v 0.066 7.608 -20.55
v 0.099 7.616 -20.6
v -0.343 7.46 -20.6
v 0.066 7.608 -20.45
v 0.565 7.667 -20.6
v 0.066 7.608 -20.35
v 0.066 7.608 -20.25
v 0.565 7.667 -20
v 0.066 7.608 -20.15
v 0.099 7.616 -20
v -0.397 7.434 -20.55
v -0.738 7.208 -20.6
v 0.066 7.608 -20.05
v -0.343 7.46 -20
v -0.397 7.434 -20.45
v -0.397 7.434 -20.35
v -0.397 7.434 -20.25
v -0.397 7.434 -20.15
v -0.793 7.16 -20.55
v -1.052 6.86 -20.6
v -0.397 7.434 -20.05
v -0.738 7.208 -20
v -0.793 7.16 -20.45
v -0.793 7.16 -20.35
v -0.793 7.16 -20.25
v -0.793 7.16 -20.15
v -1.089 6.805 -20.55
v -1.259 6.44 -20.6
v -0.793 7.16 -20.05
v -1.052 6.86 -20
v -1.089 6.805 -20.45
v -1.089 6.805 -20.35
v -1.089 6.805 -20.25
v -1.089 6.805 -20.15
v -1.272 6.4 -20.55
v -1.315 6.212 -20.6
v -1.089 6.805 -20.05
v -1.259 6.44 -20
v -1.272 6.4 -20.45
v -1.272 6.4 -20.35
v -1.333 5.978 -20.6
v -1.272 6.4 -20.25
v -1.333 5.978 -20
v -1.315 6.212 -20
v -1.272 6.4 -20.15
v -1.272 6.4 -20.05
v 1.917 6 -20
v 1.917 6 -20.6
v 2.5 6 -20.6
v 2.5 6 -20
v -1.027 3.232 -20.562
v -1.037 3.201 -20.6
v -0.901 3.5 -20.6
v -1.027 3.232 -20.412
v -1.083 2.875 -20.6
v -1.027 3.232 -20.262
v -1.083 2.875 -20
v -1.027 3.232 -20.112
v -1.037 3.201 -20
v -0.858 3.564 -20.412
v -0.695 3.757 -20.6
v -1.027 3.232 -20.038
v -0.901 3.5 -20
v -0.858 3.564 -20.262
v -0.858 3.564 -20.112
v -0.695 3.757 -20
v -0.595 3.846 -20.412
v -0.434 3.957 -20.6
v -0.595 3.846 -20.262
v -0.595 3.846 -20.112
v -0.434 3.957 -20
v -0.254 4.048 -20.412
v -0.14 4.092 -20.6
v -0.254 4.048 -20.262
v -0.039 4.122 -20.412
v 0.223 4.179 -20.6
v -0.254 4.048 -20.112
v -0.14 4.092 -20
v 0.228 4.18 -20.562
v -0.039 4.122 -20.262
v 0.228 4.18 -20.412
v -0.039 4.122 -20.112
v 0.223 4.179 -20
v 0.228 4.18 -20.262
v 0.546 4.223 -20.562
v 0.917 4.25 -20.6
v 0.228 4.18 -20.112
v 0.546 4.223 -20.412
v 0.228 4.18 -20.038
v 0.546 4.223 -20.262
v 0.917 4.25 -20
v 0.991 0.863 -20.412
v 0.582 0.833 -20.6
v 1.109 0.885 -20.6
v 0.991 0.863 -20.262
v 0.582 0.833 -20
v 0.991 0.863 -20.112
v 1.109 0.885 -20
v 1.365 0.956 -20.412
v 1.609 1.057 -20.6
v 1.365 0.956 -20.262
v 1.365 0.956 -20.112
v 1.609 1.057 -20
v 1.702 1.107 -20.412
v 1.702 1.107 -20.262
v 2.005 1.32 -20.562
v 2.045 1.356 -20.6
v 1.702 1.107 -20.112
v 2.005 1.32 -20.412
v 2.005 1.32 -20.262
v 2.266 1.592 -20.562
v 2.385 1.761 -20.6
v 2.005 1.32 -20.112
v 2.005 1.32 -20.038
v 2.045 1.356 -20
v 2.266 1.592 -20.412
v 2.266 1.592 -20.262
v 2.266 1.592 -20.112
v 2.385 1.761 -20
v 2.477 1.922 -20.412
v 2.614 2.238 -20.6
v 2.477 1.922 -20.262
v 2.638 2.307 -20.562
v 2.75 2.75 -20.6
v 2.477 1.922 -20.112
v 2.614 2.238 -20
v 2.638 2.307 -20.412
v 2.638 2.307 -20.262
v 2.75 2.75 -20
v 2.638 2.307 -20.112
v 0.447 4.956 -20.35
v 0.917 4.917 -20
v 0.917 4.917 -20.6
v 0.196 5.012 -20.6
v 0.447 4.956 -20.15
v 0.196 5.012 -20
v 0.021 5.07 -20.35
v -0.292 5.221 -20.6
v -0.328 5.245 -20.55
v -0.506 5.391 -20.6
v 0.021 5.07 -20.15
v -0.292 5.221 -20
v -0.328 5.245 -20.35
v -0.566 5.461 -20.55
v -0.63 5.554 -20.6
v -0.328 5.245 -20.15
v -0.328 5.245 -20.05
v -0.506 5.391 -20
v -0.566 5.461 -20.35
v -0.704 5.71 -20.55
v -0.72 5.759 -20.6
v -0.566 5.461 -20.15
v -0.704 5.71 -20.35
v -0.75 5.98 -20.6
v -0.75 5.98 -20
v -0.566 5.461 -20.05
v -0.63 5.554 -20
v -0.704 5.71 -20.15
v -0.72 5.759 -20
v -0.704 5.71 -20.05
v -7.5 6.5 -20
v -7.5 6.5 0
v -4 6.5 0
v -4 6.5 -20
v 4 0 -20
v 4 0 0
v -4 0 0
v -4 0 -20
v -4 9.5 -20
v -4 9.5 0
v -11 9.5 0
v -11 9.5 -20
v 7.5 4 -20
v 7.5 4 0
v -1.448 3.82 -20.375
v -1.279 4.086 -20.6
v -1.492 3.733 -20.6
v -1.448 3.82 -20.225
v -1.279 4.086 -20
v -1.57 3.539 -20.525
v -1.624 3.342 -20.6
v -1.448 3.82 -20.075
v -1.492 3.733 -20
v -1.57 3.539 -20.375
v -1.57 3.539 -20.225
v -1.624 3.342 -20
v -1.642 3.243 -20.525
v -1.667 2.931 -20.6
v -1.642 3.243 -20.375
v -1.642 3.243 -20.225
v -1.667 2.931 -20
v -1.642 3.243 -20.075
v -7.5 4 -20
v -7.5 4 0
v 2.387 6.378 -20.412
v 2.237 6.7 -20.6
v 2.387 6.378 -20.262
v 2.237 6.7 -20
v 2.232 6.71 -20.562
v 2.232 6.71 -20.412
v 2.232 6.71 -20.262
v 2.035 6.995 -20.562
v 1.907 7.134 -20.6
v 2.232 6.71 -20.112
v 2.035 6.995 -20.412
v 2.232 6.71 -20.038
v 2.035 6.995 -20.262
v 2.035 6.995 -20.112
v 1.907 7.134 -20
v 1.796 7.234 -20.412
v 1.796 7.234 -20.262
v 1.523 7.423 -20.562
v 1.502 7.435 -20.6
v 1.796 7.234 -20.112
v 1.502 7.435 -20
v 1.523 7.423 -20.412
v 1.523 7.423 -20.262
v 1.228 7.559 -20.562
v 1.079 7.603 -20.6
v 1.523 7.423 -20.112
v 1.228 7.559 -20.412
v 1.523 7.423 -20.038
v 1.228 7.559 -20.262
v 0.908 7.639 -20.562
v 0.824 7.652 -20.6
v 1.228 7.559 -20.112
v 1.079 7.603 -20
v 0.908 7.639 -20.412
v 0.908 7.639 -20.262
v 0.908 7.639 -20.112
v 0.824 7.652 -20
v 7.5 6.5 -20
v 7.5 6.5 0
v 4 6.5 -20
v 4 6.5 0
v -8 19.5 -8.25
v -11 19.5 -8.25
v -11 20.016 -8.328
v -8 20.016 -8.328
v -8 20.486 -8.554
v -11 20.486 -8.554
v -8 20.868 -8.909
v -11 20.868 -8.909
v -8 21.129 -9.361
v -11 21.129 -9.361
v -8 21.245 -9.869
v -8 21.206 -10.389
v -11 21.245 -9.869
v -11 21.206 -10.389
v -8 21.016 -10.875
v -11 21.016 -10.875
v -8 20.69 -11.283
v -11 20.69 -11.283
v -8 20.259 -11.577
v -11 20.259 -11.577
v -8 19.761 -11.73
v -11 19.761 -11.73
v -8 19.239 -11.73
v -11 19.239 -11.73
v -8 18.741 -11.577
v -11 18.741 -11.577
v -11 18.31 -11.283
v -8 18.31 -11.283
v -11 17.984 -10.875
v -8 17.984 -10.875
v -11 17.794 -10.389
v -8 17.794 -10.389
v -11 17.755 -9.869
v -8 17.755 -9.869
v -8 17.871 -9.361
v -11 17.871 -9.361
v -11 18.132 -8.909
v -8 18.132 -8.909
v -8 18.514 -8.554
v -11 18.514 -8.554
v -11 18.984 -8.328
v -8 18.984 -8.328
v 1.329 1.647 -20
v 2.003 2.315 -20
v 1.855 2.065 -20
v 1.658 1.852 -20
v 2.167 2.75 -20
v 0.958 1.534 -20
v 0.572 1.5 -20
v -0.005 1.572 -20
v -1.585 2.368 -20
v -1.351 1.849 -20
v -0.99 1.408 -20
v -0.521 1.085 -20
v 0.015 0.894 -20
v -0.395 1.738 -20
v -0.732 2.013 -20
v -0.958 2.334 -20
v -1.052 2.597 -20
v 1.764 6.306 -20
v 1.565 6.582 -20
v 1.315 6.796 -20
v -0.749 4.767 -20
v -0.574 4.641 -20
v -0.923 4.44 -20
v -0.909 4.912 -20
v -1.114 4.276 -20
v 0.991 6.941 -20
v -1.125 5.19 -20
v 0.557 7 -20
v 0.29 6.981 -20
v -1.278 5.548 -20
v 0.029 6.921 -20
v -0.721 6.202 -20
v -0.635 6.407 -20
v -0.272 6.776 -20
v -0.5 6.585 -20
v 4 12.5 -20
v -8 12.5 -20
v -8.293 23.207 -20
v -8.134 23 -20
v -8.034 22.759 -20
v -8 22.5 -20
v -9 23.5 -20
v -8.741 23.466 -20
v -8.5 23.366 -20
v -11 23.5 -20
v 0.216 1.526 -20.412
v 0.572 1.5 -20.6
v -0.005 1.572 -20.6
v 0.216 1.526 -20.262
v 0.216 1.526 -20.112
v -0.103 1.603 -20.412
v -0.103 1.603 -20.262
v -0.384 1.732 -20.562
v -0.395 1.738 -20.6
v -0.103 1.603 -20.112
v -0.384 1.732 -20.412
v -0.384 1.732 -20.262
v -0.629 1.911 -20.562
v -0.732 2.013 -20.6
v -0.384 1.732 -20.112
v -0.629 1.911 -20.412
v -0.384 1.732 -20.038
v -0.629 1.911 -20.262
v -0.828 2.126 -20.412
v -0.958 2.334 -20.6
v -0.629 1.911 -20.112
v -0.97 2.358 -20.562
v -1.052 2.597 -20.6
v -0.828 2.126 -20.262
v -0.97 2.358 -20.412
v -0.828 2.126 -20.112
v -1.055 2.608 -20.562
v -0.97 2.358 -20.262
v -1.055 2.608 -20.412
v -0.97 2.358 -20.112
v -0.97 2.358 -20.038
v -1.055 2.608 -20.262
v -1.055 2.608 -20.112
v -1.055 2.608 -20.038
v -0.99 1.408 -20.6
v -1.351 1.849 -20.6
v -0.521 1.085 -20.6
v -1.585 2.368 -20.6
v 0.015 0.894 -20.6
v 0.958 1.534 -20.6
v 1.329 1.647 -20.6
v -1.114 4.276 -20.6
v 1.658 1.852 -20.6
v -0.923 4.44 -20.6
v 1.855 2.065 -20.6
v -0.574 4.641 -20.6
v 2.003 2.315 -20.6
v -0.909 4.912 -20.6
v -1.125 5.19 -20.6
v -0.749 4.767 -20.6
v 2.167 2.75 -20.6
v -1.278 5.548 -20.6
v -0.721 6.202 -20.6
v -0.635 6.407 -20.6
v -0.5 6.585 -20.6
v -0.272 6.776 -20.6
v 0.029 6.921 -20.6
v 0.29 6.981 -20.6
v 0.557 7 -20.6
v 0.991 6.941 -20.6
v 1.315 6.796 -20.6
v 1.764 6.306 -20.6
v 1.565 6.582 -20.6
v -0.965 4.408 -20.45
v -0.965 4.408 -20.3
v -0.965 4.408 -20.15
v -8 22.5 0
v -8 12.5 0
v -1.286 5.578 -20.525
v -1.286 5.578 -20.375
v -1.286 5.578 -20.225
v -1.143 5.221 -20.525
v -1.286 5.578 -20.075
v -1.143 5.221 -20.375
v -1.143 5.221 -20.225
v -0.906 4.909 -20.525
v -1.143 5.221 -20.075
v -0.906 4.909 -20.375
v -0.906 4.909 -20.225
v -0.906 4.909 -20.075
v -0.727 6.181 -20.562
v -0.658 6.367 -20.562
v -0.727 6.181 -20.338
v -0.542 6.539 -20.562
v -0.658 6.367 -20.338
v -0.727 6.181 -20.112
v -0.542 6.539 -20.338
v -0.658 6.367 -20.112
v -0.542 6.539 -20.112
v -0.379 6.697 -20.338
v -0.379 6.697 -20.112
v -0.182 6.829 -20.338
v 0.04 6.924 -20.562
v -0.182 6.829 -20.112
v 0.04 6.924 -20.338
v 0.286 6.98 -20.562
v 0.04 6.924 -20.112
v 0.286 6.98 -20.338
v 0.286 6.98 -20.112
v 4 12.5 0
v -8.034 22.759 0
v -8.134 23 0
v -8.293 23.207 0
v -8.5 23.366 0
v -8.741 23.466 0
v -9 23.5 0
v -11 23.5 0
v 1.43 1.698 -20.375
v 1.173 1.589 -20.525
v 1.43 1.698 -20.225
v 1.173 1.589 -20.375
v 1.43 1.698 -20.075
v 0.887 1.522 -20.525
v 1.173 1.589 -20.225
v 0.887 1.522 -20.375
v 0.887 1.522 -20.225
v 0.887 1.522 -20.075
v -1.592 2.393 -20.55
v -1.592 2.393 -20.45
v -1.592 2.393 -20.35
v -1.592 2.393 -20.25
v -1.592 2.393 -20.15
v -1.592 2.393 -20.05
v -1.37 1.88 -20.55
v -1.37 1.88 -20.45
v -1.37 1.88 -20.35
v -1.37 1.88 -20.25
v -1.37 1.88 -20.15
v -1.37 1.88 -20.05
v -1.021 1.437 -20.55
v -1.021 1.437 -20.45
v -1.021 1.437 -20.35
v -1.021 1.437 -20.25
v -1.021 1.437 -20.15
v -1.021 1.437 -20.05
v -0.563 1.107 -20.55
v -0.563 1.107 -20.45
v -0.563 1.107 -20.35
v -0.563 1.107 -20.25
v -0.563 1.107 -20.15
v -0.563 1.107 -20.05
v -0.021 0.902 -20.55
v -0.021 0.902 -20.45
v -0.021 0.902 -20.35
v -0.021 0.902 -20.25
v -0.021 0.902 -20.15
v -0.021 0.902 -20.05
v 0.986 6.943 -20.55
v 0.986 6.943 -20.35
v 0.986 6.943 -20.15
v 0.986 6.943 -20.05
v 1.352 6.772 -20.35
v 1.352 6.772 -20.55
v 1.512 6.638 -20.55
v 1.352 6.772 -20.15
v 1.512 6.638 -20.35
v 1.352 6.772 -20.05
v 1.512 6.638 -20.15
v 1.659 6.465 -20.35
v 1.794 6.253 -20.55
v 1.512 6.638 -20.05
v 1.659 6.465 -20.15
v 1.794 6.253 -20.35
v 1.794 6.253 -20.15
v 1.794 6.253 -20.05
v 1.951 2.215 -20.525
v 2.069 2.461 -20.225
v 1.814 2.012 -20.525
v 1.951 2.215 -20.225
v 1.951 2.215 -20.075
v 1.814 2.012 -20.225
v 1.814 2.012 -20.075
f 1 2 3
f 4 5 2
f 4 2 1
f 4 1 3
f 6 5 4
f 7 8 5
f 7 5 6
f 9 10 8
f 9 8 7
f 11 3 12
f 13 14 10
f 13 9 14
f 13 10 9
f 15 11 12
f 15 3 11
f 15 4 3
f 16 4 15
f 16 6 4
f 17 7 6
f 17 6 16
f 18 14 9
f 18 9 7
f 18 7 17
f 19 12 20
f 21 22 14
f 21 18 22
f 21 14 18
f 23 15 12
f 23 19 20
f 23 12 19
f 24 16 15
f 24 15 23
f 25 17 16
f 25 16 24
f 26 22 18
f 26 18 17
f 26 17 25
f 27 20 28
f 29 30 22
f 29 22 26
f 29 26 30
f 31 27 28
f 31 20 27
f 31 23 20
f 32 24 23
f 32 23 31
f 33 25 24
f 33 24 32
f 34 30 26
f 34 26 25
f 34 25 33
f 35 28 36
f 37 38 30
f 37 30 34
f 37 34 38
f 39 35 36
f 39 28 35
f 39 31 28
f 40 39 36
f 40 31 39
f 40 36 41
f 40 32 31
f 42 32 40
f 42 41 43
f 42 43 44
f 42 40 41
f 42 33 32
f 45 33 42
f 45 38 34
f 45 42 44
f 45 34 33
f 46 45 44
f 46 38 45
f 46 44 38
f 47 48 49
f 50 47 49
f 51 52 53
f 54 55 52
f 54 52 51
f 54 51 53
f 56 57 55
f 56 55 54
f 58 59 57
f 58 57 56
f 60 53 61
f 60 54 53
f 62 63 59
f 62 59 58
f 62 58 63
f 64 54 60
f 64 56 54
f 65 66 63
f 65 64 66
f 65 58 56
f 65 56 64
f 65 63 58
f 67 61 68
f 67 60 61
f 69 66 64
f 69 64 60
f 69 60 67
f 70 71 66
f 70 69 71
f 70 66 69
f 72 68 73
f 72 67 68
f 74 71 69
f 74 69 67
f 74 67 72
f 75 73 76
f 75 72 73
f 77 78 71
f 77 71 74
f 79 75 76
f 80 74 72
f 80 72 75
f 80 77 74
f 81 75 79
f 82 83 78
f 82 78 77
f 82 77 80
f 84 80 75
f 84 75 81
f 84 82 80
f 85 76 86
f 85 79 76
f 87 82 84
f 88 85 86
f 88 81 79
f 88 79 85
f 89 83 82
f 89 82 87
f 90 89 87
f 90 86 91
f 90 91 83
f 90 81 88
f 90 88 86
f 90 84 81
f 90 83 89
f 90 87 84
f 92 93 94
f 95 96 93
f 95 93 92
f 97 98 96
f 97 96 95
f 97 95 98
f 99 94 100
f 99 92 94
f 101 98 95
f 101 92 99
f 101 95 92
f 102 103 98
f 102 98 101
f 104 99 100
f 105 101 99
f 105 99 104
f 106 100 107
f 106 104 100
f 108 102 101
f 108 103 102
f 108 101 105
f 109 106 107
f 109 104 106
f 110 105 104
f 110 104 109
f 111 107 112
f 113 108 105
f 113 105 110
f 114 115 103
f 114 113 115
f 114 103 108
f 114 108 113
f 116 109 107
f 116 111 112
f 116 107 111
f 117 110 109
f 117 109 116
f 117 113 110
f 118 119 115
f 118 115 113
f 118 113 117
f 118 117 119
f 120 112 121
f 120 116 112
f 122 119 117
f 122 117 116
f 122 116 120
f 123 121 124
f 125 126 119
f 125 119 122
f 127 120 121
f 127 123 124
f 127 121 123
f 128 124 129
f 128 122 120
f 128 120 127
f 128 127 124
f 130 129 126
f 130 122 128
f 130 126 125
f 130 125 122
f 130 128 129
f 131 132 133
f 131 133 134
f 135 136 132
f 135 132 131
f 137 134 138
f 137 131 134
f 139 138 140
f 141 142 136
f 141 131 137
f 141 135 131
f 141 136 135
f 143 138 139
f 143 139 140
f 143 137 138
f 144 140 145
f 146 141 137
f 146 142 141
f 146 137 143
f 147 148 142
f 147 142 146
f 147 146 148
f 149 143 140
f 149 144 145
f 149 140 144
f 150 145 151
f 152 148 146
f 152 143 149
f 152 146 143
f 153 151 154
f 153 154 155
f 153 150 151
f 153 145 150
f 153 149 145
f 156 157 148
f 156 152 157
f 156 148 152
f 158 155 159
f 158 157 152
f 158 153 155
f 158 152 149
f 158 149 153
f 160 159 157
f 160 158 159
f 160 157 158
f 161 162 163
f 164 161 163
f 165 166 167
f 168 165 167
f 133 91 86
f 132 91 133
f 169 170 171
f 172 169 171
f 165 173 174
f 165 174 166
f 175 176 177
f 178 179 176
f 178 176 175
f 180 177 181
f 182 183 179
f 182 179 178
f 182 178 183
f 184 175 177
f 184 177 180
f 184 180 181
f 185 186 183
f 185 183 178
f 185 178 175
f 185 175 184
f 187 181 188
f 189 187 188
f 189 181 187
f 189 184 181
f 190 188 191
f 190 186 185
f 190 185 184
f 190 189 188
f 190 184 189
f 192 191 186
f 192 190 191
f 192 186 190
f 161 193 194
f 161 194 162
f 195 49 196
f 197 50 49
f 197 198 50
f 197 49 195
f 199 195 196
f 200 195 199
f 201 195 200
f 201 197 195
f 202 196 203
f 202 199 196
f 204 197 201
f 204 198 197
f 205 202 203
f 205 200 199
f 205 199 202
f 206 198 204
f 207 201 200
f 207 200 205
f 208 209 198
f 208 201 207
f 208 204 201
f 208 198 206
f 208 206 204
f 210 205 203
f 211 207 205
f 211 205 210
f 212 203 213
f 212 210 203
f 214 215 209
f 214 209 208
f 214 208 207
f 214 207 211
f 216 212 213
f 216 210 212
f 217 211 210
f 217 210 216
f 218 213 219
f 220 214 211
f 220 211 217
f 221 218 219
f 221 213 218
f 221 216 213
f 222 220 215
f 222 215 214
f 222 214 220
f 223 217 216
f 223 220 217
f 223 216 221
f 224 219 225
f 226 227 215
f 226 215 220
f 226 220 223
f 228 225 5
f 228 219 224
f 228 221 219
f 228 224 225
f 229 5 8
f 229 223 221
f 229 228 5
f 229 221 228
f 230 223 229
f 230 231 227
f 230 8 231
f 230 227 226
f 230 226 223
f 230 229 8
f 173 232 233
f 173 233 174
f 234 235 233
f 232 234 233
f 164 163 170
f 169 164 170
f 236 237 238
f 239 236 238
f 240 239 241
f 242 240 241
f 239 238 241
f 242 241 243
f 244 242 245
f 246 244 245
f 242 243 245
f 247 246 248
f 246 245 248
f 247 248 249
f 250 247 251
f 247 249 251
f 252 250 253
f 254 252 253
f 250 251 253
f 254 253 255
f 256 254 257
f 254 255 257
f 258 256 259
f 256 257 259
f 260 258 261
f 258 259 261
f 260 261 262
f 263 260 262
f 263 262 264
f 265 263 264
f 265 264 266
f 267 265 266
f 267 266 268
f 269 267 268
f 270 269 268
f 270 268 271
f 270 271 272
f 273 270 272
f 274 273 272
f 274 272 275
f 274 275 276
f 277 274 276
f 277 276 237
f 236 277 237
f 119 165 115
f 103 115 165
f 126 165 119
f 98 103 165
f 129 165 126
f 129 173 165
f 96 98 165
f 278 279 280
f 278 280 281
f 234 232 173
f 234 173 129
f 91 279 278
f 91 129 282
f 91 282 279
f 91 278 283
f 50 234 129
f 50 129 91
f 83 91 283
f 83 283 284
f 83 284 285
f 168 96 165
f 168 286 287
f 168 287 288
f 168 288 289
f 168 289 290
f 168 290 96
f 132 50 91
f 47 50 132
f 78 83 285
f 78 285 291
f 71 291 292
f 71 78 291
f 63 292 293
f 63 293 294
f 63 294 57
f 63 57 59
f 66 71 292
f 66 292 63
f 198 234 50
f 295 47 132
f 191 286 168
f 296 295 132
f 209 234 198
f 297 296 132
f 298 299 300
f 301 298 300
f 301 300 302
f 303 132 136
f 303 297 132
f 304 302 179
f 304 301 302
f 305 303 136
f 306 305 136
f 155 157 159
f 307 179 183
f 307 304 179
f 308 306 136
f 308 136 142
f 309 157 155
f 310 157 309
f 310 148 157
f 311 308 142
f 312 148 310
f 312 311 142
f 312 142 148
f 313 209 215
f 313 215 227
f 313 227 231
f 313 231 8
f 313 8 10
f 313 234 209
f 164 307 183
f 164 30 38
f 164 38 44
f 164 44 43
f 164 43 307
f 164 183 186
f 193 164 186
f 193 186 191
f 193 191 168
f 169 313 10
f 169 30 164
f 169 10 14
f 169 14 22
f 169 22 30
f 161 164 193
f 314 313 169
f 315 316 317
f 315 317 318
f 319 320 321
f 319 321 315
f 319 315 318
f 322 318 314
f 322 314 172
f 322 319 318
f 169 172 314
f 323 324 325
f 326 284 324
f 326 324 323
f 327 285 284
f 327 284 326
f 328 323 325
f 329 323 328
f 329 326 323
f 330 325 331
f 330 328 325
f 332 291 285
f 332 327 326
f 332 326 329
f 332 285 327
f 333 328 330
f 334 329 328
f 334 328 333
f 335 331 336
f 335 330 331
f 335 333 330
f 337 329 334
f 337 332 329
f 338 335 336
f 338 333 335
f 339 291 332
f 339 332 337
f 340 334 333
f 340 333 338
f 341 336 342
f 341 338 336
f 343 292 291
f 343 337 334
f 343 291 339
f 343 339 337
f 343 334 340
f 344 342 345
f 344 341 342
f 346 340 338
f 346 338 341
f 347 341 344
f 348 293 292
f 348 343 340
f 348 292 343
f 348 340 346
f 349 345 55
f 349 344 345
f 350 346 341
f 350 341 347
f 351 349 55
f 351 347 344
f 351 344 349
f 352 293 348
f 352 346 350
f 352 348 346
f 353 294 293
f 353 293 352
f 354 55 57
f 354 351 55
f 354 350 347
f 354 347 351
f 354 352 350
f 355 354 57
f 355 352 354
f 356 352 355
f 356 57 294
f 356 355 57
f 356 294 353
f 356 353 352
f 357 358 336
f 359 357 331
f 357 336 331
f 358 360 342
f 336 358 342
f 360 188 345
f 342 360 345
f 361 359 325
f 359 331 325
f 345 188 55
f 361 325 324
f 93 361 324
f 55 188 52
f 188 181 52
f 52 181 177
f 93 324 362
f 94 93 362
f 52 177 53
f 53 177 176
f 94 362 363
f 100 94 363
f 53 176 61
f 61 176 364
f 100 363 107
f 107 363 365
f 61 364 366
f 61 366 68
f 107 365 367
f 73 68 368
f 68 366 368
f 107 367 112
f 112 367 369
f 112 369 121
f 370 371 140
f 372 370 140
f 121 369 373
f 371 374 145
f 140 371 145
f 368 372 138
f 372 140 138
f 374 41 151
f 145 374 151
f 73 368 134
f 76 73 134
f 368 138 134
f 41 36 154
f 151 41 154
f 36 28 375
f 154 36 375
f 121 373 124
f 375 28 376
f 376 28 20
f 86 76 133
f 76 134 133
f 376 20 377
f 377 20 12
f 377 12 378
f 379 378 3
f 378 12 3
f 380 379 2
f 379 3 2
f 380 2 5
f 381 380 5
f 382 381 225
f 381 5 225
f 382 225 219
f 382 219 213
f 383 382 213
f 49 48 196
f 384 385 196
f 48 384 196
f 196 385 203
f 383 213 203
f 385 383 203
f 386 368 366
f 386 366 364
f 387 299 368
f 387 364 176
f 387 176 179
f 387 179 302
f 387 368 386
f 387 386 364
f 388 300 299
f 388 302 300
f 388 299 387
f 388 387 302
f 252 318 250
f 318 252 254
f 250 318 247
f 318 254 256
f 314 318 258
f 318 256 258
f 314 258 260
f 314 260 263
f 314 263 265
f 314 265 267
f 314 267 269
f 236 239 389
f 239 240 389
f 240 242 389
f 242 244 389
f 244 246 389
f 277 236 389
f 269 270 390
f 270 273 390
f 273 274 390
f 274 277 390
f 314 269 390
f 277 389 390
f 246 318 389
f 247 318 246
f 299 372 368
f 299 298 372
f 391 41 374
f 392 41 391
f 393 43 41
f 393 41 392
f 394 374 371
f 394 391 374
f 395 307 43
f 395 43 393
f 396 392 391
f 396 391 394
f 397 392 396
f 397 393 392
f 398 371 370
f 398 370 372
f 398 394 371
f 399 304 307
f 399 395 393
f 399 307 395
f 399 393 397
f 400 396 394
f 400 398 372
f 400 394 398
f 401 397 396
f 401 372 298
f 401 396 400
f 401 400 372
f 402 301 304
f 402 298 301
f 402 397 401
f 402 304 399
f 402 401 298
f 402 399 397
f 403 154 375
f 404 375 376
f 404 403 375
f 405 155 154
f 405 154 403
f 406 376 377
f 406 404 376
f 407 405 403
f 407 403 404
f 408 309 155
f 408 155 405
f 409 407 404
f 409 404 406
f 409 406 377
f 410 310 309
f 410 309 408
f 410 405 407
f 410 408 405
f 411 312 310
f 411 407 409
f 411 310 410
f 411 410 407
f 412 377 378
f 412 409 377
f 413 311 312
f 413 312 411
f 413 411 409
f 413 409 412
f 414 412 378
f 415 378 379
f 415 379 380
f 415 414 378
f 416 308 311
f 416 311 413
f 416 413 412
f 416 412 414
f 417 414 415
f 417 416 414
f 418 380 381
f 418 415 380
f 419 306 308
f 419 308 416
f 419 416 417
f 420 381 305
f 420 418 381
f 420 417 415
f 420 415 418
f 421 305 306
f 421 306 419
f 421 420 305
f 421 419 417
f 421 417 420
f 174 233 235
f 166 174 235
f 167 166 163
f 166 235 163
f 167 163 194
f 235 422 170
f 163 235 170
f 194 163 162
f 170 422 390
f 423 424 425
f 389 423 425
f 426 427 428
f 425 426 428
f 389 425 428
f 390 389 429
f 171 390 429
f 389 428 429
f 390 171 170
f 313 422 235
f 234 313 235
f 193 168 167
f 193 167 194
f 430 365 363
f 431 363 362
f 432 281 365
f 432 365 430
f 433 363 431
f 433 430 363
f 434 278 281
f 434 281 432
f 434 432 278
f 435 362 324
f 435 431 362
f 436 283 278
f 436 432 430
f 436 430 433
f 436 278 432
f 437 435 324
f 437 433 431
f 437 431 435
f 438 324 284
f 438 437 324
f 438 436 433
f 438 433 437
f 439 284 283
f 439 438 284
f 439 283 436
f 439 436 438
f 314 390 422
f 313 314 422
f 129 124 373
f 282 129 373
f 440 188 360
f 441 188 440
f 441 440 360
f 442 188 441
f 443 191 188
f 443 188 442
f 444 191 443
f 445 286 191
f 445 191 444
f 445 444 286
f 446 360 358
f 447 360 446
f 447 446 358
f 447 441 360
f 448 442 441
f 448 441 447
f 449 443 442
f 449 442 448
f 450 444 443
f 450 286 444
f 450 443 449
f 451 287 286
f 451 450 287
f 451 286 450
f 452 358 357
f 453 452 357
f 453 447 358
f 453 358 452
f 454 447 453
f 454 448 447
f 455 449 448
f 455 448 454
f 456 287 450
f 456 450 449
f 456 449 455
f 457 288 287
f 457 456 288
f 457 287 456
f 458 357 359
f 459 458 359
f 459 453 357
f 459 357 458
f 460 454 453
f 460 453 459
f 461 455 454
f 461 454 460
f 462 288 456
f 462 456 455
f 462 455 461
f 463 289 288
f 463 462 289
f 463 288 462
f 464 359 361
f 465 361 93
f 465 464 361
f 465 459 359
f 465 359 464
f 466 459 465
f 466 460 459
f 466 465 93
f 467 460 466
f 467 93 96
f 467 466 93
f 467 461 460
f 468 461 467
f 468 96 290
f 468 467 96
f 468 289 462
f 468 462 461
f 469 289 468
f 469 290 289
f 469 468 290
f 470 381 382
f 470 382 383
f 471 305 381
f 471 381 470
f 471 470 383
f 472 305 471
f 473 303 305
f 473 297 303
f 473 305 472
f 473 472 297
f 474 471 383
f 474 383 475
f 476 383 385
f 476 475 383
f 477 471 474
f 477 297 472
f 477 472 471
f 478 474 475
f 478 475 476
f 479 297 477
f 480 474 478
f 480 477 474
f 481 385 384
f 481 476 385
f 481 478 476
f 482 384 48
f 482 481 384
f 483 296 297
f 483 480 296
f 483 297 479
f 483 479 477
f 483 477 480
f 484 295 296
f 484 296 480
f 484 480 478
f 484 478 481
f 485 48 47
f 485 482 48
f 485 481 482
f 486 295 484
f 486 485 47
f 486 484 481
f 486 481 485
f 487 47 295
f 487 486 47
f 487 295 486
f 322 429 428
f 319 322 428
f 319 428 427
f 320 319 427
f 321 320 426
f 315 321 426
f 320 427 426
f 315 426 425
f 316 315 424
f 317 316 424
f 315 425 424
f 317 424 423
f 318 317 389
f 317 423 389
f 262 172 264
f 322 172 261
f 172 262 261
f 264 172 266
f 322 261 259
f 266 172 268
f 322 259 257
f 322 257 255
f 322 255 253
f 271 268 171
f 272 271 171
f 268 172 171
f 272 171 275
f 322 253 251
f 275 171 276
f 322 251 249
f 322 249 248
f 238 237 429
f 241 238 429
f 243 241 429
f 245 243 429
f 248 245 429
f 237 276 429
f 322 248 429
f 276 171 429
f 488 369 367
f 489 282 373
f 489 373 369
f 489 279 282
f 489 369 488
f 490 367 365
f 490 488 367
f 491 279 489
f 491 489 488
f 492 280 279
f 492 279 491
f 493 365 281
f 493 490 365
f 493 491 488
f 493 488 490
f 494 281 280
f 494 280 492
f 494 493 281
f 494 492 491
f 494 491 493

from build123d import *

# Parameters (mm, degrees)
ESTRUSIONE_ESTRUSIONE1_DEPTH = 20
TAGLIO_ESTRUSIONE1_REACH     = 37.979
SCHIZZO6_R                   = 1.75
ESTRUSIONE_ESTRUSIONE4_DEPTH = 0.6


with BuildPart() as part:
    # Schizzo2 → Estrusione-Estrusione1 (new body)
    with BuildSketch(Plane.XY):
        with BuildLine():
            Line((-4, 9.5), (-11, 9.5))
            Line((-11, 9.5), (-11, 23.5))
            Line((-11, 23.5), (-9, 23.5))
            ThreePointArc((-9, 23.5), (-8.292893219, 23.207106781), (-8, 22.5))
            Line((-8, 22.5), (-8, 12.5))
            Line((-8, 12.5), (4, 12.5))
            Line((4, 12.5), (4, 9.5))
            Line((4, 9.5), (4, 6.5))
            Line((4, 6.5), (7.5, 6.5))
            Line((7.5, 6.5), (7.5, 4))
            Line((7.5, 4), (4, 0))
            Line((4, 0), (-4, 0))
            Line((-4, 0), (-7.5, 4))
            Line((-7.5, 4), (-7.5, 6.5))
            Line((-7.5, 6.5), (-4, 6.5))
            Line((-4, 6.5), (-4, 9.5))
        make_face()
    extrude(amount=-ESTRUSIONE_ESTRUSIONE1_DEPTH)

    # Schizzo6 → Taglio-Estrusione1 (cut, up to next)
    with BuildSketch(Plane.ZY.offset(11), mode=Mode.PRIVATE) as taglio_estrusione1_sk1:
        with Locations((-10, 19.5)):
            Circle(SCHIZZO6_R)
    taglio_estrusione1_tool1 = extrude(taglio_estrusione1_sk1.sketch, amount=-TAGLIO_ESTRUSIONE1_REACH, mode=Mode.PRIVATE) & part.part
    add(taglio_estrusione1_tool1.solids().sort_by_distance((-11, 19.5, -10))[0], mode=Mode.SUBTRACT)

    # Schizzo11 → Estrusione-Estrusione4 (add)
    with BuildSketch(Plane(origin=(0, 0, -20), x_dir=(-1, 0, 0), z_dir=(0, 0, -1))):
        with BuildLine():
            Line((-1.916666667, 6), (-2.5, 6))
            add(Edge.make_bspline(
                [(-2.5, 6), (-2.484196549, 6.065431756), (-2.453302094, 6.193345487), (-2.388863743, 6.376101829), (-2.318665127, 6.549045511), (-2.234371075, 6.708938219), (-2.142426246, 6.858993324), (-2.037084049, 6.995807413), (-1.923204564, 7.122860063), (-1.797243944, 7.235613218), (-1.665147858, 7.337714716), (-1.525054993, 7.424768393), (-1.379783905, 7.499656106), (-1.228328086, 7.561350822), (-1.070236625, 7.607826795), (-0.906938753, 7.641546577), (-0.738006538, 7.66344436), (-0.623332441, 7.665581492), (-0.565104167, 7.666666667)],
                knots=[0, 0, 0, 0, 1.162005537, 2.271625781, 3.343758855, 4.383309926, 5.390229558, 6.379919256, 7.361854164, 8.333198761, 9.295911338, 10.242430842, 11.177959212, 12.116337295, 13.062827104, 14.020064771, 14.994644689, 16, 16, 16, 16], degree=3))
            add(Edge.make_bspline(
                [(-0.565104167, 7.666666667), (-0.480264789, 7.664105239), (-0.312436625, 7.659038256), (-0.065876681, 7.612768588), (0.171887412, 7.539550485), (0.398253158, 7.438384992), (0.608515961, 7.313608553), (0.795597451, 7.165102613), (0.956961828, 6.995732482), (1.092337101, 6.80865772), (1.198333527, 6.608726059), (1.276493935, 6.402954339), (1.324077057, 6.191830678), (1.330243806, 6.049281445), (1.333333333, 5.977864583)],
                knots=[0, 0, 0, 0, 1.083050992, 2.142477498, 3.193116406, 4.255571735, 5.30263384, 6.308962982, 7.297363603, 8.282367274, 9.249857812, 10.179914175, 11.08814088, 12, 12, 12, 12], degree=3))
            add(Edge.make_bspline(
                [(1.333333333, 5.977864583), (1.331172379, 5.909137679), (1.326943725, 5.774649792), (1.291038272, 5.578309869), (1.230613784, 5.393261183), (1.146912796, 5.218724739), (1.038564203, 5.055807179), (0.907314909, 4.904141953), (0.752238537, 4.763056374), (0.634720509, 4.682234495), (0.57421875, 4.640625)],
                knots=[0, 0, 0, 0, 1.024540389, 2.004866551, 2.965041327, 3.920577974, 4.882998113, 5.874504559, 6.905732034, 8, 8, 8, 8], degree=3))
            add(Edge.make_bspline(
                [(0.57421875, 4.640625), (0.643363437, 4.607236967), (0.780359061, 4.541085617), (0.967095758, 4.411353496), (1.136611813, 4.261563137), (1.231147291, 4.144669639), (1.278645833, 4.0859375)],
                knots=[0, 0, 0, 0, 1.015518401, 2.012035669, 3.001164323, 4, 4, 4, 4], degree=3))
            add(Edge.make_bspline(
                [(1.278645833, 4.0859375), (1.309922612, 4.043115961), (1.37196399, 3.958174116), (1.448544267, 3.821606468), (1.518018337, 3.683525131), (1.572154458, 3.540229091), (1.614077354, 3.393379209), (1.644044271, 3.24272333), (1.662660533, 3.088138431), (1.665326558, 2.983558111), (1.666666667, 2.930989583)],
                knots=[0, 0, 0, 0, 1.025084078, 2.033381695, 3.024893161, 4.013698104, 4.991890475, 5.976764909, 6.982997093, 8, 8, 8, 8], degree=3))
            add(Edge.make_bspline(
                [(1.666666667, 2.930989583), (1.663333999, 2.83997153), (1.656684346, 2.658363755), (1.597248208, 2.390053558), (1.505109333, 2.127777625), (1.374260737, 1.876924352), (1.214792507, 1.64221793), (1.025071762, 1.43221907), (0.807254146, 1.251707377), (0.56432937, 1.100888382), (0.301140417, 0.980326526), (0.019642889, 0.896648418), (-0.276107211, 0.842148704), (-0.478920764, 0.836304519), (-0.58203125, 0.833333333)],
                knots=[0, 0, 0, 0, 0.955779014, 1.907060117, 2.875433937, 3.871313158, 4.872415639, 5.851225146, 6.836215519, 7.83643374, 8.849228613, 9.86973379, 10.916971861, 12, 12, 12, 12], degree=3))
            add(Edge.make_bspline(
                [(-0.58203125, 0.833333333), (-0.651524236, 0.834945729), (-0.78826326, 0.838118387), (-0.9892869, 0.859807218), (-1.181170056, 0.899420085), (-1.364172166, 0.952726223), (-1.538455805, 1.020310887), (-1.703489143, 1.104474184), (-1.860287517, 1.203481259), (-2.007371283, 1.318500779), (-2.144722909, 1.447166124), (-2.268692254, 1.591761428), (-2.381346155, 1.74961375), (-2.479668199, 1.922556569), (-2.568136825, 2.108354904), (-2.640901459, 2.309387829), (-2.704946086, 2.523858156), (-2.73472252, 2.673316816), (-2.75, 2.75)],
                knots=[0, 0, 0, 0, 1.048658725, 2.063410685, 3.046034179, 4.001477787, 4.936774919, 5.862367409, 6.792675028, 7.730719943, 8.675894397, 9.627829632, 10.600096036, 11.597688215, 12.626045268, 13.701542398, 14.82072376, 16, 16, 16, 16], degree=3))
            Line((-2.75, 2.75), (-2.166666667, 2.75))
            add(Edge.make_bspline(
                [(-2.166666667, 2.75), (-2.151469125, 2.699951833), (-2.121908588, 2.602603799), (-2.071590606, 2.462500375), (-2.014263815, 2.33406399), (-1.952765349, 2.216352478), (-1.888176806, 2.108206588), (-1.815906231, 2.012485974), (-1.74130639, 1.924986312), (-1.685073305, 1.875689176), (-1.657552083, 1.8515625)],
                knots=[0, 0, 0, 0, 1.198163088, 2.33053128, 3.407730985, 4.417276592, 5.372219308, 6.28897303, 7.162600585, 8, 8, 8, 8], degree=3))
            add(Edge.make_bspline(
                [(-1.657552083, 1.8515625), (-1.621158441, 1.823504166), (-1.548483496, 1.767474107), (-1.430056781, 1.695971082), (-1.305507707, 1.634014892), (-1.172137598, 1.586688029), (-1.032824452, 1.54661523), (-0.885316488, 1.520391409), (-0.730915085, 1.502399091), (-0.625489239, 1.500811361), (-0.571614583, 1.5)],
                knots=[0, 0, 0, 0, 0.946170439, 1.889420265, 2.845303464, 3.807233317, 4.801018734, 5.828864929, 6.890507805, 8, 8, 8, 8], degree=3))
            add(Edge.make_bspline(
                [(-0.571614583, 1.5), (-0.51078665, 1.501143824), (-0.391842877, 1.503380473), (-0.218283853, 1.523949643), (-0.053170021, 1.553906125), (0.101665412, 1.600173093), (0.24825064, 1.657337532), (0.384530847, 1.729113142), (0.512295044, 1.813324768), (0.629906797, 1.909040348), (0.735662739, 2.013823125), (0.828778978, 2.123418828), (0.907939064, 2.237365369), (0.97179428, 2.356293307), (1.022216731, 2.479710161), (1.056542675, 2.607962273), (1.080409774, 2.740000053), (1.082353483, 2.829753852), (1.083333333, 2.875)],
                knots=[0, 0, 0, 0, 1.217147791, 2.380027433, 3.494444702, 4.572153297, 5.609568379, 6.639424714, 7.649109417, 8.668170816, 9.669597737, 10.625200337, 11.543417969, 12.441394052, 13.322311151, 14.205496177, 15.095365482, 16, 16, 16, 16], degree=3))
            add(Edge.make_bspline(
                [(1.083333333, 2.875), (1.080491345, 2.935563915), (1.074821509, 3.056390388), (1.031534147, 3.234151597), (0.960333399, 3.405423649), (0.860655878, 3.567284402), (0.739318097, 3.71729679), (0.597497555, 3.851143829), (0.43401656, 3.961588284), (0.283551089, 4.037895789), (0.150272941, 4.089964642), (0.036215798, 4.124646719), (-0.091475036, 4.154014937), (-0.231255399, 4.181337727), (-0.384178515, 4.204591659), (-0.5500779, 4.223983603), (-0.728987171, 4.239500107), (-0.852842194, 4.246429284), (-0.916666667, 4.25)],
                knots=[0, 0, 0, 0, 1.07054697, 2.135767047, 3.216561865, 4.33974944, 5.486079747, 6.621378074, 7.775625952, 8.963672916, 9.598146892, 10.304877434, 11.070270905, 11.915000392, 12.823868403, 13.805723172, 14.86925407, 16, 16, 16, 16], degree=3))
            Line((-0.916666667, 4.25), (-0.916666667, 4.916666667))
            add(Edge.make_bspline(
                [(-0.916666667, 4.916666667), (-0.836250216, 4.918031302), (-0.678734144, 4.920704288), (-0.448644721, 4.95303345), (-0.228622855, 4.997754616), (-0.02354462, 5.066255688), (0.163374419, 5.145816239), (0.325539394, 5.238398914), (0.460678382, 5.34131202), (0.568134658, 5.456144008), (0.648974654, 5.579300525), (0.708081563, 5.707660032), (0.742996455, 5.842347574), (0.747657265, 5.934266243), (0.75, 5.98046875)],
                knots=[0, 0, 0, 0, 1.321986639, 2.589447074, 3.816329219, 5.01088745, 6.139805852, 7.153945165, 8.075214402, 8.924034688, 9.728124013, 10.488707548, 11.240355623, 12, 12, 12, 12], degree=3))
            add(Edge.make_bspline(
                [(0.75, 5.98046875), (0.74923038, 6.014413134), (0.747699256, 6.081943876), (0.728390026, 6.180604717), (0.69937395, 6.276249331), (0.659483024, 6.368470979), (0.606089798, 6.456630059), (0.542192966, 6.541478178), (0.466109351, 6.622530911), (0.37892495, 6.698080076), (0.285303026, 6.770080088), (0.182696301, 6.831205413), (0.074198534, 6.883474814), (-0.040310397, 6.926578176), (-0.161202096, 6.959002568), (-0.28790856, 6.982283416), (-0.420671401, 6.996839061), (-0.511247475, 6.99893469), (-0.557291667, 7)],
                knots=[0, 0, 0, 0, 0.884392785, 1.759457502, 2.611959086, 3.489218968, 4.37281399, 5.2945488, 6.255912374, 7.266815255, 8.301784654, 9.332968512, 10.37626691, 11.440494194, 12.520033166, 13.637162961, 14.798855837, 16, 16, 16, 16], degree=3))
            add(Edge.make_bspline(
                [(-0.557291667, 7), (-0.631301907, 6.997416042), (-0.775861121, 6.992368971), (-0.984260252, 6.948163375), (-1.177996158, 6.877632648), (-1.326082253, 6.793442755), (-1.435435605, 6.710334806), (-1.51357849, 6.637753232), (-1.590316581, 6.557092273), (-1.660601409, 6.463383862), (-1.731681652, 6.362974109), (-1.79639298, 6.2507587), (-1.859275266, 6.129664825), (-1.897165715, 6.044058647), (-1.916666667, 6)],
                knots=[0, 0, 0, 0, 1.472543308, 2.876219568, 4.221790263, 5.565193594, 6.249813518, 6.953379497, 7.687249741, 8.463570142, 9.283606569, 10.136032583, 11.040678096, 12, 12, 12, 12], degree=3))
        make_face()
    extrude(amount=ESTRUSIONE_ESTRUSIONE4_DEPTH)


solid = part.part
